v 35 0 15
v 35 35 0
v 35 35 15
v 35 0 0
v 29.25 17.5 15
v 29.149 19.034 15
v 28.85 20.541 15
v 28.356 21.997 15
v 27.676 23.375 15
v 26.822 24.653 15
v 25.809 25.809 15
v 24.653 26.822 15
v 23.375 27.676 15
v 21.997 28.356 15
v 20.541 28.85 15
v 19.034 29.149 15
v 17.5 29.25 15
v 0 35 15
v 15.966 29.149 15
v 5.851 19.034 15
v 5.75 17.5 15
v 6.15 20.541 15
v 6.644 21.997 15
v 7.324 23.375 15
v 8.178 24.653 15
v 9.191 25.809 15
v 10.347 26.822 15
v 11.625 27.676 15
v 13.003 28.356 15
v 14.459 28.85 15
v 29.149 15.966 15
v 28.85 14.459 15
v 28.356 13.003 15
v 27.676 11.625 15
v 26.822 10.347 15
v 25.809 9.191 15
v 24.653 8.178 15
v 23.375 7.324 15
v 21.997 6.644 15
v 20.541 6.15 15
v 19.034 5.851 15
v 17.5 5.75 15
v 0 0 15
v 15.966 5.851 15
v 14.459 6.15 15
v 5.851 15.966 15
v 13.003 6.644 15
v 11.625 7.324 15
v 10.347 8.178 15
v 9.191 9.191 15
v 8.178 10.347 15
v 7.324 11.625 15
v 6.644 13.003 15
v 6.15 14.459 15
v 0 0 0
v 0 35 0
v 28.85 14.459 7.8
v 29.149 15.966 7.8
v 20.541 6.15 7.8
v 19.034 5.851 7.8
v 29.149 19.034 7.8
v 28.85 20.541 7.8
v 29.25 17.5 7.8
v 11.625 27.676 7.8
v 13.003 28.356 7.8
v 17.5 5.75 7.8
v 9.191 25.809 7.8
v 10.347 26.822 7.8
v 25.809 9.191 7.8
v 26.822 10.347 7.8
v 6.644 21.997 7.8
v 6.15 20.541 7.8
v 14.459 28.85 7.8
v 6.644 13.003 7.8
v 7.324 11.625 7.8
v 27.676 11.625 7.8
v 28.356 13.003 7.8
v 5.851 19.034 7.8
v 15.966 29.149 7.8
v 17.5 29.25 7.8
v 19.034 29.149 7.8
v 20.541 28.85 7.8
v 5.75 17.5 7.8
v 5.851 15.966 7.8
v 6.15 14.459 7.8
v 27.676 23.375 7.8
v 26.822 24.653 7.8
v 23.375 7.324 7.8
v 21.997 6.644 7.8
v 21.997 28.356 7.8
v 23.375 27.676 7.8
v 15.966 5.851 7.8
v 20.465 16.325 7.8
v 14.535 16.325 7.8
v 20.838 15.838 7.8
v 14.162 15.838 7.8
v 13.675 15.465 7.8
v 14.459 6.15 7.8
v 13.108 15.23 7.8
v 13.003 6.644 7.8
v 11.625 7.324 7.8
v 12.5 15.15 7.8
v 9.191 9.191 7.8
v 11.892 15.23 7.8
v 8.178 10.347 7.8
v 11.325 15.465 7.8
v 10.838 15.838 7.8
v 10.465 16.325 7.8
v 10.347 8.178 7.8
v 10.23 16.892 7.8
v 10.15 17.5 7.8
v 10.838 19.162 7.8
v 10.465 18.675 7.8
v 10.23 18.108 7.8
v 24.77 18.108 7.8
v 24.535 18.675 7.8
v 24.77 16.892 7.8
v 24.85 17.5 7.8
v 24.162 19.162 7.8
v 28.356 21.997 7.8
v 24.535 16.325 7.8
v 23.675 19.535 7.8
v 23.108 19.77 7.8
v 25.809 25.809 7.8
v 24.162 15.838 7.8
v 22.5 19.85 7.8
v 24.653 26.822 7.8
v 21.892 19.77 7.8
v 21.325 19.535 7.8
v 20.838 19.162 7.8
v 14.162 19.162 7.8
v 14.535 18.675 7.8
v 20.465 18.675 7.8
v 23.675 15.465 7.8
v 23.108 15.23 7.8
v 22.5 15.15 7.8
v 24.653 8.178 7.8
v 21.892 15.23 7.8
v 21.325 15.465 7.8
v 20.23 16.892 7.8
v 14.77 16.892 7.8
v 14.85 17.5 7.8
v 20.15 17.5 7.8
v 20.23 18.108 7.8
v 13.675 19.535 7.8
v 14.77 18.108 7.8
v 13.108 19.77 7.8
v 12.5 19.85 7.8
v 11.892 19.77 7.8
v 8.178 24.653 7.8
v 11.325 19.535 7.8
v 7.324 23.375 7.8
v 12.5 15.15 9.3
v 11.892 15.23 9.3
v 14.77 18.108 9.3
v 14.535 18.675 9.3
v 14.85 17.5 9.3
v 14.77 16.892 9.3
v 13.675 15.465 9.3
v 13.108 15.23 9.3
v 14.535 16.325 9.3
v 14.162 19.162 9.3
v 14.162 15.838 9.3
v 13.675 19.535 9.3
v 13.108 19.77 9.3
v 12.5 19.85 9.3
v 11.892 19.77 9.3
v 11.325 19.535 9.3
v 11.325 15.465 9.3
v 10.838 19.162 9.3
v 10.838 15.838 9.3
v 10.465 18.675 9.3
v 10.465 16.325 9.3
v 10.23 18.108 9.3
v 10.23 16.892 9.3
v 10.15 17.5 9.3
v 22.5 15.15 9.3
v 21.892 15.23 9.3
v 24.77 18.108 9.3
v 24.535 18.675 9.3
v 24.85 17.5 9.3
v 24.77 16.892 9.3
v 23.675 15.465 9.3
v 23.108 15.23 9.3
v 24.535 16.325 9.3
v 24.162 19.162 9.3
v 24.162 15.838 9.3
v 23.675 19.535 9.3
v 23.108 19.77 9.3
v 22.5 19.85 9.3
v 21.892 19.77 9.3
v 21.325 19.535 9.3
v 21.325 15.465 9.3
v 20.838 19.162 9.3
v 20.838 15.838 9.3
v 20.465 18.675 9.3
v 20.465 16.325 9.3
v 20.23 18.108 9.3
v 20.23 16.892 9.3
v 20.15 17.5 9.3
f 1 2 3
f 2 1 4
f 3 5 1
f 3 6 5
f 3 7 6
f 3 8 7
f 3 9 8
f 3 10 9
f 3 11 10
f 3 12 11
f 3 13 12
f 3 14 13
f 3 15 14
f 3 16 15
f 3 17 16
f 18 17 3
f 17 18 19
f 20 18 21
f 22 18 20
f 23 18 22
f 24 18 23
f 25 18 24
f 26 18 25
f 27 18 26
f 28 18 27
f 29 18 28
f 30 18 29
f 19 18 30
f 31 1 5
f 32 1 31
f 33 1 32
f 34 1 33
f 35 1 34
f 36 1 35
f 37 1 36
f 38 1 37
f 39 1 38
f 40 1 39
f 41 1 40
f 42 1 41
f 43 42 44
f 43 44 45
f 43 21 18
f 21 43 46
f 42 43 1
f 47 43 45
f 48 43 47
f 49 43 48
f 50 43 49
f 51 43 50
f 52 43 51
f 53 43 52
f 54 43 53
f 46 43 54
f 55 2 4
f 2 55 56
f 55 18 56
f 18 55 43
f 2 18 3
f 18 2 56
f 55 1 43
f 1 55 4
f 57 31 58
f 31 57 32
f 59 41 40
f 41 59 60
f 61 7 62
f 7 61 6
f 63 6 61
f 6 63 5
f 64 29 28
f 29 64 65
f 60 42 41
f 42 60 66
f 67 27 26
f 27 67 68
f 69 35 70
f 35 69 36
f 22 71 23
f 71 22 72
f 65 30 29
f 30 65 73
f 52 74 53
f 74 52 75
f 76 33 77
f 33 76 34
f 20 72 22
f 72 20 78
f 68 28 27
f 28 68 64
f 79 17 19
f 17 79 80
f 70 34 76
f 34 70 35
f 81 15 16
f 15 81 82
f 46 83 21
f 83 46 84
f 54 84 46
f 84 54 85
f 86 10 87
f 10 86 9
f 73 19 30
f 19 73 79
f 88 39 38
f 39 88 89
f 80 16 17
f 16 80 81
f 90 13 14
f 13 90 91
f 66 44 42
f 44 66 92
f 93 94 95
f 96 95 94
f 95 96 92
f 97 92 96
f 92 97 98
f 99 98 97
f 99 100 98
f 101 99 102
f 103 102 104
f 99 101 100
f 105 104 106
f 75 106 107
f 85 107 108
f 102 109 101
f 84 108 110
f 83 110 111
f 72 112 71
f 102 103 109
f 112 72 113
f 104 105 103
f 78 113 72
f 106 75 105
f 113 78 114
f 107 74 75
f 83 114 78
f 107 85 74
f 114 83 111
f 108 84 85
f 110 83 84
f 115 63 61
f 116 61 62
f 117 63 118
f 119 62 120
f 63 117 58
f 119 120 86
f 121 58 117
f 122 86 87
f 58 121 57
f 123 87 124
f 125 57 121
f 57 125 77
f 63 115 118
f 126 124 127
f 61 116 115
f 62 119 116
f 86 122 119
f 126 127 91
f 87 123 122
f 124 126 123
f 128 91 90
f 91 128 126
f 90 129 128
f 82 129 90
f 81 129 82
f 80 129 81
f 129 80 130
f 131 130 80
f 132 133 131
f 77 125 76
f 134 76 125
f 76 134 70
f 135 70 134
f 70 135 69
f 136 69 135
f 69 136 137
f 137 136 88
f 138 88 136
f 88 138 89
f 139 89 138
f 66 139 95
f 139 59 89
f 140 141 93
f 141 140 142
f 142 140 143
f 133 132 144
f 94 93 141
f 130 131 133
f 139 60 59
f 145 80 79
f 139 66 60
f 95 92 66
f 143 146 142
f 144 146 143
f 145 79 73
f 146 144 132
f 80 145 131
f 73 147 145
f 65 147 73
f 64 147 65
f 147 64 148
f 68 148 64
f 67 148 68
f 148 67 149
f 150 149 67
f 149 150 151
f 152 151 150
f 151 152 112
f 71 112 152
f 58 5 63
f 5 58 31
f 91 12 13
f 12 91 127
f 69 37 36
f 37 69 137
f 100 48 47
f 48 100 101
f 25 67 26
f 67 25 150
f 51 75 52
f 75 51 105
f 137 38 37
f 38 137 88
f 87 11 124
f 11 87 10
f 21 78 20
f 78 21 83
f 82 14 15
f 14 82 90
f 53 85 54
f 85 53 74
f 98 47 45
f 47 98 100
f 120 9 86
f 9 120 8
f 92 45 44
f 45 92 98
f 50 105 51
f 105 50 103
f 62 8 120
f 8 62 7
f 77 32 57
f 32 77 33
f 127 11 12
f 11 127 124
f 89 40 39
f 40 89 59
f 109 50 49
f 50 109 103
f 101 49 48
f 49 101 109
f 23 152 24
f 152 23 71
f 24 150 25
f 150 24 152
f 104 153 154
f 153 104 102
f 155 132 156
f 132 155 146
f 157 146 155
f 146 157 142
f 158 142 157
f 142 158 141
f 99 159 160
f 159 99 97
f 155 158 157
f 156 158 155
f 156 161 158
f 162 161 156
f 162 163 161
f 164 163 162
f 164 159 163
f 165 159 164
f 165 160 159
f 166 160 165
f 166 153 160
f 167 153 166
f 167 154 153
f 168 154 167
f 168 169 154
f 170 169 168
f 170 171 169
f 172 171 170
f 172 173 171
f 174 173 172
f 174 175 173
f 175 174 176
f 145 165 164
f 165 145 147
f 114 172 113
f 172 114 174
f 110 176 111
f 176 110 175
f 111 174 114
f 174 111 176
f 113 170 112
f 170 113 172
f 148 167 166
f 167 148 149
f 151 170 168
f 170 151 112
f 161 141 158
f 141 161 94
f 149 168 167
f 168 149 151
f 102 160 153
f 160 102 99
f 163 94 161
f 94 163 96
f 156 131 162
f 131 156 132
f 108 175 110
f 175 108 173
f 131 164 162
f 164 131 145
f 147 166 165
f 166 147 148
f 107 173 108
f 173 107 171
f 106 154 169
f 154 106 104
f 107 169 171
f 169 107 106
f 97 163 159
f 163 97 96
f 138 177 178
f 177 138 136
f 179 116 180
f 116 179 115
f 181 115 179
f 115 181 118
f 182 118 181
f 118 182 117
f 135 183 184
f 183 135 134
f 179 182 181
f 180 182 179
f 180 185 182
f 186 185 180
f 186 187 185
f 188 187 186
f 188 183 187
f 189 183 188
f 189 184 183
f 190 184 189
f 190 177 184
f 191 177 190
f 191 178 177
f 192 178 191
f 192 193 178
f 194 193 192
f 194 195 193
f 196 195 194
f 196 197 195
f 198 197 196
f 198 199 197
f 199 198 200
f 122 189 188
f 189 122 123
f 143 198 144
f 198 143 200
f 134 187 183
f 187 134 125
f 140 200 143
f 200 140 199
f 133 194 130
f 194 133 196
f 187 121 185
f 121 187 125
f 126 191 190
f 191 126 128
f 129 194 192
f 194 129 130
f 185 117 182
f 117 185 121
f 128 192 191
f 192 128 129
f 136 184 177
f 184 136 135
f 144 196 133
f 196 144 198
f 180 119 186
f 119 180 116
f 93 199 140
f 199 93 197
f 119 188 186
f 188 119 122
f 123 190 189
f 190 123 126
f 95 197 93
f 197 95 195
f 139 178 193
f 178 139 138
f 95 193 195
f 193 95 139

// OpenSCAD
////////////////////////////////////////////////////////////////////////////////
// settings

box_x = 35;
box_y = 35;
box_z = 15;

measurement_tolerance = 0.5;

////////////////////////////////////////////////////////////////////////////////
// measurements

connector_diameter = 22.5;
connector_full_depth = 13.2;
connector_thread_depth = 6.0;
connector_handle_depth = connector_full_depth - connector_thread_depth;

peg_depth = 1.5;
peg_diameter = 5.7;
peg_offset = 5.0;

////////////////////////////////////////////////////////////////////////////////

corner_cutout_length = sqrt( 2 * connector_diameter * connector_diameter ) / 2;

////////////////////////////////////////////////////////////////////////////////

render()
{
    difference()
    {
        cube([ box_x, box_y, box_z ]);

        // cut out the cylinder
        translate([ box_x / 2, box_y / 2, box_z - connector_handle_depth ])
            cylinder( h = connector_handle_depth, r = connector_diameter / 2 + measurement_tolerance, $fn = 48 );
    }
}

color([ 0.5, 0, 0 ])
    translate([ box_x / 2 - peg_offset, box_y / 2, box_z - connector_handle_depth ])
        cylinder( h = peg_depth, r = peg_diameter / 2 - measurement_tolerance, $fn = 24 );

color([ 0, 0, 0.5 ])
    translate([ box_x / 2 + peg_offset, box_y / 2, box_z - connector_handle_depth ])
        cylinder( h = peg_depth, r = peg_diameter / 2 - measurement_tolerance, $fn = 24 );
